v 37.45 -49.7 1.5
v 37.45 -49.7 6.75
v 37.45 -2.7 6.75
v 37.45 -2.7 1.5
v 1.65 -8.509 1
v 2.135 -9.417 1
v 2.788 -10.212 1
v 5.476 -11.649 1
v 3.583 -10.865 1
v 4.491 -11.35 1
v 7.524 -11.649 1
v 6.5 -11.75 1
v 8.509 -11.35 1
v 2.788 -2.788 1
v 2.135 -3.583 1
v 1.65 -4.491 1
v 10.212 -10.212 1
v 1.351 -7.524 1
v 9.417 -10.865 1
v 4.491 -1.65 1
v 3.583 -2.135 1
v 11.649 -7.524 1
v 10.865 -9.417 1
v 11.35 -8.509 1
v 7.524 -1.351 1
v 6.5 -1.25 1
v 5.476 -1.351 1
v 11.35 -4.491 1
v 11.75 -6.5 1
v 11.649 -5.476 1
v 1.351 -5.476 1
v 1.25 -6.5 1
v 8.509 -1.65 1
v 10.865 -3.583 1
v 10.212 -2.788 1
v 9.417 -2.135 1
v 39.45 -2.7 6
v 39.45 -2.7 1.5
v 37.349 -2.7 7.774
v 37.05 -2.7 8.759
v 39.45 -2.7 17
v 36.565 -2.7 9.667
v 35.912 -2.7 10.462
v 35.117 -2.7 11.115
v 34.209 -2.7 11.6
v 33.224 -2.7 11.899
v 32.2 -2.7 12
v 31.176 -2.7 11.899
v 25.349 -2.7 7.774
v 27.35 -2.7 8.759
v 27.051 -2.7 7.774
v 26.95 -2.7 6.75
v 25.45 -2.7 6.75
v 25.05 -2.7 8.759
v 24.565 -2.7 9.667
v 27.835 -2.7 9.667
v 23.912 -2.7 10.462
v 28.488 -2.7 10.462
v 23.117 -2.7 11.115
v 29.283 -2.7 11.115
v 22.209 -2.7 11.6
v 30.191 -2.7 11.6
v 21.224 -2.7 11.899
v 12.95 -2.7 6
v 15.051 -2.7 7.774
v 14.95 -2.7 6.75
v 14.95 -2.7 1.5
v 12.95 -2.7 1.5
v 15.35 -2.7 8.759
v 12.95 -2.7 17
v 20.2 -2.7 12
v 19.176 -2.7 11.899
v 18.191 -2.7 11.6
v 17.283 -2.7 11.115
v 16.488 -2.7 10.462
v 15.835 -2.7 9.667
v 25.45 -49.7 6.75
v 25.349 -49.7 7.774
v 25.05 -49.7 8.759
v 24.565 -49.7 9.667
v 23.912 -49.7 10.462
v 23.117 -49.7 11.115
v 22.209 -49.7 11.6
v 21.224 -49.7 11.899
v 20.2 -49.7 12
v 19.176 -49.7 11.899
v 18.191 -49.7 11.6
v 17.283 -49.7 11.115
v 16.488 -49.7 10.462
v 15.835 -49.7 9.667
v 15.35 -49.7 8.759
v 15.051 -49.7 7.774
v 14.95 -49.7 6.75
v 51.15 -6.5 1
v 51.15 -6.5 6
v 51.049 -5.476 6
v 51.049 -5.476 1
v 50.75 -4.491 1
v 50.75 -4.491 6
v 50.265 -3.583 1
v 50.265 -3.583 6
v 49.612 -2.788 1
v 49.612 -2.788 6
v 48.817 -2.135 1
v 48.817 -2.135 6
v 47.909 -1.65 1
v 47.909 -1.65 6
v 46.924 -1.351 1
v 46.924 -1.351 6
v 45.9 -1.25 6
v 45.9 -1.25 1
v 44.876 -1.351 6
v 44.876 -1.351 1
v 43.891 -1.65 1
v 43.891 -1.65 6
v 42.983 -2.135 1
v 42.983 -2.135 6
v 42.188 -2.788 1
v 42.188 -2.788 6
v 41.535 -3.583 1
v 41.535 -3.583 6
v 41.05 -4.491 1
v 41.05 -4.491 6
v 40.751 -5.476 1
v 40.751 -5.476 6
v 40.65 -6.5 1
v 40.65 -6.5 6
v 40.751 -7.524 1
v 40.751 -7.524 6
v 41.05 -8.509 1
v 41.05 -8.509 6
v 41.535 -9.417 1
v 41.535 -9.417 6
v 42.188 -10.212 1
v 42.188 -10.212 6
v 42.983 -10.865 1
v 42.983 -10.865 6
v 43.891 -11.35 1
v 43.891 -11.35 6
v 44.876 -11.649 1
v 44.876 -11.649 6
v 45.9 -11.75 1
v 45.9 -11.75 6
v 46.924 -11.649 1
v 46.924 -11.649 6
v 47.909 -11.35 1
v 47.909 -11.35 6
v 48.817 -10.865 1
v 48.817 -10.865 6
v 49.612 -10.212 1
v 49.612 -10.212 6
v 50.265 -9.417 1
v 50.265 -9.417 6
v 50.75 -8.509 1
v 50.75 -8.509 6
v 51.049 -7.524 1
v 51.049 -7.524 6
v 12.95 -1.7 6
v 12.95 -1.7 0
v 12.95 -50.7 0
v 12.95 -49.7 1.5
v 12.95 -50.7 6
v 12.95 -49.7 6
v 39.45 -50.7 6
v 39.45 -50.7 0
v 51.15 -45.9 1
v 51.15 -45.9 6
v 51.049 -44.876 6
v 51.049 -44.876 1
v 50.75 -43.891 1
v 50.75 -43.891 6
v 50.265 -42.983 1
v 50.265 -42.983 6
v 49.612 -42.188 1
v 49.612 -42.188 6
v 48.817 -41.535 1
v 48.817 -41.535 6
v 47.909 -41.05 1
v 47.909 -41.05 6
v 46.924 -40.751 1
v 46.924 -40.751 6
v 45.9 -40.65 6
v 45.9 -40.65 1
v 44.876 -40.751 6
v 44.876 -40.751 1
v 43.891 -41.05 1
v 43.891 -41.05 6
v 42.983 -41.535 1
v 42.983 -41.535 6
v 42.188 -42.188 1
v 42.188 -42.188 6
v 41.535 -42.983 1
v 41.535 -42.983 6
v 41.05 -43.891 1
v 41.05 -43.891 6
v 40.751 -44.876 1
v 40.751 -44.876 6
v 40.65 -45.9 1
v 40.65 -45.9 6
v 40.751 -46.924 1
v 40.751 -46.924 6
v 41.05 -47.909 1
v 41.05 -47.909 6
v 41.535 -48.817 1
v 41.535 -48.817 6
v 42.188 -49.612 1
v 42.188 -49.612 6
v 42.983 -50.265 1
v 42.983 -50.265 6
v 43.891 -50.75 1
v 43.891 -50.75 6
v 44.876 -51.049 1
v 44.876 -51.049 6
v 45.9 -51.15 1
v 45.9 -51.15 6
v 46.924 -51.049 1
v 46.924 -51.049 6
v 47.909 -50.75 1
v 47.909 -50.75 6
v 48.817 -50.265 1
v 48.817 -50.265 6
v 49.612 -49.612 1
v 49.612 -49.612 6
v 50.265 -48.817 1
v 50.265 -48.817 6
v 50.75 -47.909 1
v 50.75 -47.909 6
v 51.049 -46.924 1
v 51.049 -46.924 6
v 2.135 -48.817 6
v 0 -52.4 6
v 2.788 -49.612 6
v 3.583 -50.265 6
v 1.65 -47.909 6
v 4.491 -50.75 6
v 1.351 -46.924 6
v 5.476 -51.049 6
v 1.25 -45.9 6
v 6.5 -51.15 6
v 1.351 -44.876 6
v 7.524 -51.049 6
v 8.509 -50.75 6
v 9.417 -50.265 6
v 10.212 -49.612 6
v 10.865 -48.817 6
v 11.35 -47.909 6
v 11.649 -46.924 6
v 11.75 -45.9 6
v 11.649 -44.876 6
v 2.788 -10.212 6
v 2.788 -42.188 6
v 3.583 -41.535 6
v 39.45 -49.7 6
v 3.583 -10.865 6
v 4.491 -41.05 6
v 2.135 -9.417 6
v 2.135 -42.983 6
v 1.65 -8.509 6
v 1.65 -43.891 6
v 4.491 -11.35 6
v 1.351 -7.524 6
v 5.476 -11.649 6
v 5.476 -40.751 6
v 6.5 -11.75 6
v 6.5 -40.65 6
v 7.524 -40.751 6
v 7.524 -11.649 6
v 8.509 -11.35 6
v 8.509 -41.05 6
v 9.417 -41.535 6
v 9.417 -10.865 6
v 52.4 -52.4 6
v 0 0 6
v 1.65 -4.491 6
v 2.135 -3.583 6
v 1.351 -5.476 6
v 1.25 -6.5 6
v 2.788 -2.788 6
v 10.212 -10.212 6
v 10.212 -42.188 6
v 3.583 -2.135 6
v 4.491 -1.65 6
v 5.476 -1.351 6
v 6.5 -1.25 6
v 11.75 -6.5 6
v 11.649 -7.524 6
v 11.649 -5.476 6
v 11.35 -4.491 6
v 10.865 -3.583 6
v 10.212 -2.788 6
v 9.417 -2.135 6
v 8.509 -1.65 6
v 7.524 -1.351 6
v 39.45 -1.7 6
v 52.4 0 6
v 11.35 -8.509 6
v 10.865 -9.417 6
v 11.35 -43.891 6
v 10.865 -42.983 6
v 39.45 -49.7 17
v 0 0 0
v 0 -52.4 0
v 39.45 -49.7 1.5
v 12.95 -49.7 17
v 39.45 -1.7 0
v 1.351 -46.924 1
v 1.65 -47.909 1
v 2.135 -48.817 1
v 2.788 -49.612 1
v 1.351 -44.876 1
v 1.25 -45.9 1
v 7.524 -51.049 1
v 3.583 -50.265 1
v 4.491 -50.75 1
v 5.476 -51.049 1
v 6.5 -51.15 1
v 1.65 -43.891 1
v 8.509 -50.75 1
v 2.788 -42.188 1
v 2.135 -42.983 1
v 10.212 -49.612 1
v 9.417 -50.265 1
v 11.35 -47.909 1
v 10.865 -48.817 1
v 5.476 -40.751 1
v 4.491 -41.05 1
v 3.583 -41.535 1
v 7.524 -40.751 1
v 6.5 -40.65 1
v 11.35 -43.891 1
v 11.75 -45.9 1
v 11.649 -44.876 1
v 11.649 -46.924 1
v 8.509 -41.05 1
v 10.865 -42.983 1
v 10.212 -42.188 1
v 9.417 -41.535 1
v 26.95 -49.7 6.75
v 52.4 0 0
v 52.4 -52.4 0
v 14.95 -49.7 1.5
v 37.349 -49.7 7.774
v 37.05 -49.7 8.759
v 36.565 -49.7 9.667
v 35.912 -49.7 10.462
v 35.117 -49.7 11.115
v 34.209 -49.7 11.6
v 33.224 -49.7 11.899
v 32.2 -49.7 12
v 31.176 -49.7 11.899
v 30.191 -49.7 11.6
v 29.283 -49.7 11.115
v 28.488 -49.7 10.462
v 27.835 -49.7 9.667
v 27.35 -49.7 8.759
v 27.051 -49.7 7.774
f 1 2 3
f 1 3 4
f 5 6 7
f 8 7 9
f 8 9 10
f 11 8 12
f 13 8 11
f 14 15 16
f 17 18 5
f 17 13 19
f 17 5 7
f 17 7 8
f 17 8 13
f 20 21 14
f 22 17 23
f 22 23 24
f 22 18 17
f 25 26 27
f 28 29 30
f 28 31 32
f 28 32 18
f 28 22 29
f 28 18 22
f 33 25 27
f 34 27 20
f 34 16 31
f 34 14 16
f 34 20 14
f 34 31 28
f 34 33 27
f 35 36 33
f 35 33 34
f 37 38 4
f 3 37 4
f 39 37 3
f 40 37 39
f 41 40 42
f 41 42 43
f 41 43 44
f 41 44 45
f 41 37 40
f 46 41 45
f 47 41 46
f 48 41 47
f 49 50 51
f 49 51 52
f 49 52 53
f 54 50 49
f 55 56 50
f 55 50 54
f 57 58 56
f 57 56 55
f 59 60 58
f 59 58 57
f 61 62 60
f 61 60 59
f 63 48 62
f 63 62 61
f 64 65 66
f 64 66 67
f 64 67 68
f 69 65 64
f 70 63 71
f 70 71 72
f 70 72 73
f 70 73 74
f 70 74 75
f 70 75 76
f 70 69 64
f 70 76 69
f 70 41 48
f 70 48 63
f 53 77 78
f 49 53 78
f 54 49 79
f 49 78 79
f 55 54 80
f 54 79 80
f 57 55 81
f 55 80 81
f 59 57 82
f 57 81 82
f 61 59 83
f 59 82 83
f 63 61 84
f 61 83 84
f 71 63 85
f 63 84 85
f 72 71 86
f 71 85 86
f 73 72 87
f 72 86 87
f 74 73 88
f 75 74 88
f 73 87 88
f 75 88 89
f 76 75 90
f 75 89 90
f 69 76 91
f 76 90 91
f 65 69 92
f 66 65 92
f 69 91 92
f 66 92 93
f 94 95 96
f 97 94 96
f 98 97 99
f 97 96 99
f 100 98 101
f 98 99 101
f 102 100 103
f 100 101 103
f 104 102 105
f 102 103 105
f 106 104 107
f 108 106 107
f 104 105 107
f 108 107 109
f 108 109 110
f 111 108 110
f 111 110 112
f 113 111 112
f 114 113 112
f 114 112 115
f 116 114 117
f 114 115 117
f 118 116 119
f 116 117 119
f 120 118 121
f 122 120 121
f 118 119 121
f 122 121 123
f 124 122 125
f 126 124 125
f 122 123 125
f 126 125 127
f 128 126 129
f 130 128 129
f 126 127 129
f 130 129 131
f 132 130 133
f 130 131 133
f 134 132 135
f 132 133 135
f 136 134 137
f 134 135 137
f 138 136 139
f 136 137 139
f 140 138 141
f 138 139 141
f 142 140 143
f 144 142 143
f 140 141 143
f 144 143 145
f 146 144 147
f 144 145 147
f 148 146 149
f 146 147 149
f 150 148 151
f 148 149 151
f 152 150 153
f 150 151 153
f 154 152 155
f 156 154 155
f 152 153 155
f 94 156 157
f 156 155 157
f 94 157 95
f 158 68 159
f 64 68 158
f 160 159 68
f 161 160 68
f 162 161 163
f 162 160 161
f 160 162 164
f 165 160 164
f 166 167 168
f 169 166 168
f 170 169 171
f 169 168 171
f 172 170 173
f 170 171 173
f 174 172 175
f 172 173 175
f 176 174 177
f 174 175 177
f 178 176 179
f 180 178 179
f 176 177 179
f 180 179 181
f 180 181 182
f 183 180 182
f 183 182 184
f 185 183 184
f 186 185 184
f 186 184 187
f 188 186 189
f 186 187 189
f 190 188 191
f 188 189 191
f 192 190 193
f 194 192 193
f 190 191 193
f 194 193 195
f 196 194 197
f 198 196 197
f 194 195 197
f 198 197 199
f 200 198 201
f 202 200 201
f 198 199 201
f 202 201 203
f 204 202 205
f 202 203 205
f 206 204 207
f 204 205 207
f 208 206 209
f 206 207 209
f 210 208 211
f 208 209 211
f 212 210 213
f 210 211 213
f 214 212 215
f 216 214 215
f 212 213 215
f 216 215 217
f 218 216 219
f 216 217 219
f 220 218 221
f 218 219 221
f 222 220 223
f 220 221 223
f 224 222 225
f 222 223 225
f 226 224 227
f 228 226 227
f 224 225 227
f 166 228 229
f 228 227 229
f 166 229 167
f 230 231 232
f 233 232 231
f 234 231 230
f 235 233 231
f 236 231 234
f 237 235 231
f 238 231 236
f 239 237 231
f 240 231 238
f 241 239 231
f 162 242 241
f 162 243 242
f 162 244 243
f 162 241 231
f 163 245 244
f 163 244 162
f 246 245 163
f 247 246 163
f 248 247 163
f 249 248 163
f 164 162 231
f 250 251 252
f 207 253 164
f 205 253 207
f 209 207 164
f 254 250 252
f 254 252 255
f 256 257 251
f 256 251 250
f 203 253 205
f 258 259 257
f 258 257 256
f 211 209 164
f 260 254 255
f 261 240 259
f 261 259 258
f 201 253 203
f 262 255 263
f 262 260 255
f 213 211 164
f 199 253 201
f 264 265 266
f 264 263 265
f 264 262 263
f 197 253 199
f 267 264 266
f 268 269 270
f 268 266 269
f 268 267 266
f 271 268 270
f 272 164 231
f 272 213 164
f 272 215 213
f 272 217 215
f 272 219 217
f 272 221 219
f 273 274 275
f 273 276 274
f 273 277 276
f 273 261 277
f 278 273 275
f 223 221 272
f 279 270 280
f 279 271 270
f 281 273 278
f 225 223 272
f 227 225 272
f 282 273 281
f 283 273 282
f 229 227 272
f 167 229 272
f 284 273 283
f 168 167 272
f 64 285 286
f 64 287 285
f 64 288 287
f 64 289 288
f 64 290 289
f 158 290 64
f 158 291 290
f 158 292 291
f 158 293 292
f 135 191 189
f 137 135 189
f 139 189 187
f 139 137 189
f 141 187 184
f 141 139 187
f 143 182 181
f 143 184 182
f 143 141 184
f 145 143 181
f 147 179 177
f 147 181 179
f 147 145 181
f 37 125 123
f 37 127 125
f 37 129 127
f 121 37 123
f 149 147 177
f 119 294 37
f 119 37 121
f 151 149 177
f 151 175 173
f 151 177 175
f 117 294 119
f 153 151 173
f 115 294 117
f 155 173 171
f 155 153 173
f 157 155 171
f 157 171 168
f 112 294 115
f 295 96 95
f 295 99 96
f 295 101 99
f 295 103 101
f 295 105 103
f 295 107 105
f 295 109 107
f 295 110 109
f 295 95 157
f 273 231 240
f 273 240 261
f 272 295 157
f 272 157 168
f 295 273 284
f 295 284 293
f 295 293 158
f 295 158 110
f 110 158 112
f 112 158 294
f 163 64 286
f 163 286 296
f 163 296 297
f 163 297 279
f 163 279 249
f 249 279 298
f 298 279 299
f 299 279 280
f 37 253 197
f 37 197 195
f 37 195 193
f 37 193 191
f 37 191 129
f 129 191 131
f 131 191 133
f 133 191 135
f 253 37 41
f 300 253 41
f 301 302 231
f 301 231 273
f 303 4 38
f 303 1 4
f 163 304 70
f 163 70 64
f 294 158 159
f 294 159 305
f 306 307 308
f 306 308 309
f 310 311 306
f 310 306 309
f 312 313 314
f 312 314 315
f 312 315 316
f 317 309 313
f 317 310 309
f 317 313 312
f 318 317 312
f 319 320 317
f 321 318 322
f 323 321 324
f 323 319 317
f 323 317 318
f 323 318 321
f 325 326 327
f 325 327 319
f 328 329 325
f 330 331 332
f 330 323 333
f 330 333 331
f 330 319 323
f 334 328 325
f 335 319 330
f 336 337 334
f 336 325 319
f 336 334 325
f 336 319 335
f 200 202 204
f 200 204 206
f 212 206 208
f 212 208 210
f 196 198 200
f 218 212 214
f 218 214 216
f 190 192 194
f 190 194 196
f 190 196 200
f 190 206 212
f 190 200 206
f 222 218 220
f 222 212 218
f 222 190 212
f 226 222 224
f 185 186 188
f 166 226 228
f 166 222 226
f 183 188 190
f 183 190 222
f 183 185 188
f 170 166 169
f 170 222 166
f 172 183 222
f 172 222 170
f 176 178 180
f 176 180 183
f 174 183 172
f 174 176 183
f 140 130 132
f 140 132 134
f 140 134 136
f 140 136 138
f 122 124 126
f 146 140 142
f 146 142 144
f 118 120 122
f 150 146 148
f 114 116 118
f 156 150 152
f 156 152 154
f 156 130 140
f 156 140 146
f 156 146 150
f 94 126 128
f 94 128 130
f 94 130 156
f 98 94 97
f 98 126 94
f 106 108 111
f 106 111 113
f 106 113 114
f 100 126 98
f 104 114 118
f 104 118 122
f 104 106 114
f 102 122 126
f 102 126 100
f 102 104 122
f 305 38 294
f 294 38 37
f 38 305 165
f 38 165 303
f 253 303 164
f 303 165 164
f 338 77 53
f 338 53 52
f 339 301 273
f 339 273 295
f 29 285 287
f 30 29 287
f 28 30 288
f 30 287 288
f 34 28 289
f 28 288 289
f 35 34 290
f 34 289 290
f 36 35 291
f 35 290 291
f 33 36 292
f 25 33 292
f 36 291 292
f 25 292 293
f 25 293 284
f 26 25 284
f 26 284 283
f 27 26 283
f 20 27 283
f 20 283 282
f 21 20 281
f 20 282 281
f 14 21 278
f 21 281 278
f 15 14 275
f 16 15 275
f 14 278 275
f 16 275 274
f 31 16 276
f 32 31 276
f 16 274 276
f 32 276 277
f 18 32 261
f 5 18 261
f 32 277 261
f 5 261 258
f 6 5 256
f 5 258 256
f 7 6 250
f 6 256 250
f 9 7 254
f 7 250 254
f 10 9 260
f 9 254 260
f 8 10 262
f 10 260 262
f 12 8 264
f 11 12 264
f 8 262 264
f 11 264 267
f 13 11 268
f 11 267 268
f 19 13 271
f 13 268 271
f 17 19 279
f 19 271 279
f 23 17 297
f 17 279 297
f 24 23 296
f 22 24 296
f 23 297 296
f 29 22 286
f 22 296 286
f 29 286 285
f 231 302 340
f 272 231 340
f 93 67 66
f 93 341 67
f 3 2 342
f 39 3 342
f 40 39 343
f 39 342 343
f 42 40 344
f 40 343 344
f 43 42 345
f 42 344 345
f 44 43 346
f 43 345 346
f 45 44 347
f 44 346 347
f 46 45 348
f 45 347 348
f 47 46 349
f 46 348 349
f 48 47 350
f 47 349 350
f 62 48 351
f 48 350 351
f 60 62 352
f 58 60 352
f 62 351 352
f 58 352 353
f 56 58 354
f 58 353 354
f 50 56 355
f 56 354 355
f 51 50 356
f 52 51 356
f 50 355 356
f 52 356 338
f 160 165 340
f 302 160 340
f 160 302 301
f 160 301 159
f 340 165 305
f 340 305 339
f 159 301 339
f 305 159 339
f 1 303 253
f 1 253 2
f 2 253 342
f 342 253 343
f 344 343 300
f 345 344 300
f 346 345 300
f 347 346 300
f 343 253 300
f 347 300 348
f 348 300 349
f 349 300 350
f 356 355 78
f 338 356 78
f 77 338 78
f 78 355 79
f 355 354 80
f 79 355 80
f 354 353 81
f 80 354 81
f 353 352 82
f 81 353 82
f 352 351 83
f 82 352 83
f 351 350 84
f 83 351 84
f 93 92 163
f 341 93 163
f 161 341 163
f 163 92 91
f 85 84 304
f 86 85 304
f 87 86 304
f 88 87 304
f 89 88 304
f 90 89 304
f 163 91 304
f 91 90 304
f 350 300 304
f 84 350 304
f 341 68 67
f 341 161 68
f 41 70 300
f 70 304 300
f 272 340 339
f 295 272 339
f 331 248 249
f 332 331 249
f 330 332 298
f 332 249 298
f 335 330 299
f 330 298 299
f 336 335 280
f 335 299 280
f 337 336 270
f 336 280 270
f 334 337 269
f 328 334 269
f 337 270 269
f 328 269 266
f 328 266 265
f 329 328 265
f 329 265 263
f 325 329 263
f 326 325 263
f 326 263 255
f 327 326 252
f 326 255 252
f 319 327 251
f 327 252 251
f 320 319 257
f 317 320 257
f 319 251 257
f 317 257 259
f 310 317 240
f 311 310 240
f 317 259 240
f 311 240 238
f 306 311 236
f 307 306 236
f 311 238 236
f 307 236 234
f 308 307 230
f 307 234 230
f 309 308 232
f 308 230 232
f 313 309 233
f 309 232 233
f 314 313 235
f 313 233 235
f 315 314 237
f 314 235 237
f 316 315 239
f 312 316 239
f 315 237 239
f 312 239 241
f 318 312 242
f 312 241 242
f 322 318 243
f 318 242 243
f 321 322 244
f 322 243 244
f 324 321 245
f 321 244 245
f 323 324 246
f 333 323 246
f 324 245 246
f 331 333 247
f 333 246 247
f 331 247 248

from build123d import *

# Parameters (mm, degrees)
SKETCH_W        = 52.4
SKETCH_H        = 52.4
PAD_DEPTH       = 6
SKETCH001_R     = 5.25
POCKET_DEPTH    = 5
SKETCH003_W     = 26.5
SKETCH003_H     = 9.486992
POCKET001_DEPTH = 24.5
PAD001_DEPTH    = 23.5


with BuildPart() as part:
    # Sketch → Pad (new body)
    with BuildSketch(Plane.XY):
        with Locations((26.2, -26.2)):
            Rectangle(SKETCH_W, SKETCH_H)
    extrude(amount=PAD_DEPTH)

    # Sketch001 (on Face6 of Pad) → Pocket (cut)
    with BuildSketch(Plane.XY.offset(6)):
        with Locations((6.5, -6.5)):
            Circle(SKETCH001_R)
        with Locations((45.9, -6.5)):
            Circle(SKETCH001_R)
        with Locations((45.9, -45.9)):
            Circle(SKETCH001_R)
        with Locations((6.5, -45.9)):
            Circle(SKETCH001_R)
    extrude(amount=-POCKET_DEPTH, mode=Mode.SUBTRACT)

    # Sketch003 (on DatumPlane) → Pocket001 (cut, symmetric)
    with BuildSketch(Plane.XZ.offset(26.2)):
        with Locations((26.2, 4.743496)):
            Rectangle(SKETCH003_W, SKETCH003_H)
    extrude(amount=POCKET001_DEPTH, both=True, mode=Mode.SUBTRACT)

    # Sketch004 (on DatumPlane) → Pad001 (join, symmetric)
    with BuildSketch(Plane.XZ.offset(26.2)):
        with BuildLine():
            ThreePointArc((25.45, 6.75), (20.2, 12), (14.95, 6.75))
            Line((14.95, 1.5), (14.95, 6.75))
            Line((12.95, 1.5), (14.95, 1.5))
            Line((12.95, 17), (12.95, 1.5))
            Line((12.95, 17), (39.45, 17))
            Line((39.45, 1.5), (39.45, 17))
            Line((37.45, 1.5), (39.45, 1.5))
            Line((37.45, 6.75), (37.45, 1.5))
            ThreePointArc((37.45, 6.75), (32.2, 12), (26.95, 6.75))
            Line((25.45, 6.75), (26.95, 6.75))
        make_face()
    extrude(amount=PAD001_DEPTH, both=True)


solid = part.part
